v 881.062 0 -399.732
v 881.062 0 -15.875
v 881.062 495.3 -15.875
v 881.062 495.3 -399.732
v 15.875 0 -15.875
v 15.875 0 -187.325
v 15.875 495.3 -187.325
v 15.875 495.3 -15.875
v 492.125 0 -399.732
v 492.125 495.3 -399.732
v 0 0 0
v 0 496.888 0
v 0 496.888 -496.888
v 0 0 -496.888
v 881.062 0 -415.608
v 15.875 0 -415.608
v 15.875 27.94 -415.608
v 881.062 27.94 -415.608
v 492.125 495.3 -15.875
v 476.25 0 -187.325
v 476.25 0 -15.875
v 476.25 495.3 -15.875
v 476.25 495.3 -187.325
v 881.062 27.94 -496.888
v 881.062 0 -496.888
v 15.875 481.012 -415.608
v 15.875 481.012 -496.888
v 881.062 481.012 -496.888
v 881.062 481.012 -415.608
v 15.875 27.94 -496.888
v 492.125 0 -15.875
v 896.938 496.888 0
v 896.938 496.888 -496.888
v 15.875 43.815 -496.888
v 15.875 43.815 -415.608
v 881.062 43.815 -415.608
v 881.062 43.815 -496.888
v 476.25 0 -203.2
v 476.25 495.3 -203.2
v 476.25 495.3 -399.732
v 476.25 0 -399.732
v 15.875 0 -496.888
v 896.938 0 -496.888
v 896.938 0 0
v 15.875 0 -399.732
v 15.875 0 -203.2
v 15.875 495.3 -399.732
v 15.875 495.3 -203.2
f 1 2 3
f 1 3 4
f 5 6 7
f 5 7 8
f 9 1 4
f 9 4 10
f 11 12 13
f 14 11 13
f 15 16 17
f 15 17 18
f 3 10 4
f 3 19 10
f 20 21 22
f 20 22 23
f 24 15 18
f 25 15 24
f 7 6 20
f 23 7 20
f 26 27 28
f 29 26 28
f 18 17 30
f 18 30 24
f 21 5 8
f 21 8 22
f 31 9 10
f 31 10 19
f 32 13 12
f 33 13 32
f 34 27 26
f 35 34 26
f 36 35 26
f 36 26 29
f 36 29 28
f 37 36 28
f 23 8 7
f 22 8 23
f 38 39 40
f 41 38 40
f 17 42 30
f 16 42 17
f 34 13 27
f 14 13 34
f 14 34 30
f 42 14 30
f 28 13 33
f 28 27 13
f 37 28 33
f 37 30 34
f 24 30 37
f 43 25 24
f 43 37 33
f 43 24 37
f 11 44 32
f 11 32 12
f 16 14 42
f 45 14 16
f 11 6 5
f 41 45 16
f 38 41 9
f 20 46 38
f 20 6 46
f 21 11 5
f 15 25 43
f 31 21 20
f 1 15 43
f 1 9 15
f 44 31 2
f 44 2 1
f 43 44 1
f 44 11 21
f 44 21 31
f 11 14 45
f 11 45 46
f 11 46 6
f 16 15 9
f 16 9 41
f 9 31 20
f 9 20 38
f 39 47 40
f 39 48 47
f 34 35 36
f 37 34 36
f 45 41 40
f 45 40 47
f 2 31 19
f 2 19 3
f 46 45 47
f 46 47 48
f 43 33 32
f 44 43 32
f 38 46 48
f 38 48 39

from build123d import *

# Parameters (mm, degrees)
F0_W      = 460.375
F0_H      = 15.875
F1_DEPTH  = 496.8875
F2_START  = -27.94
F0_W_2    = 865.1875
F0_H_2    = 81.28
F2_DEPTH  = 15.875
F3_START  = 437.1975
F2_FACE_W = 865.1875
F2_FACE_H = 81.28
F3_DEPTH  = 15.875
F4_START  = -495.3
F0_H_3    = 196.5325
F0_W_3    = 388.9375
F0_H_4    = 383.8575
F0_H_5    = 171.45
F4_DEPTH  = 1.5875


with BuildPart() as f1:
    # F0 (on Front) → F1 (new body)
    with BuildSketch(Plane.XZ):
        Polygon((881.0625, 0), (15.875, 0), (15.875, -15.875), (476.25, -15.875), (492.125, -15.875), (881.0625, -15.875), align=None)
        Polygon((896.9375, 0), (881.0625, 0), (881.0625, -15.875), (881.0625, -399.7325), (881.0625, -415.6075), (881.0625, -496.8875), (896.9375, -496.8875), align=None)
        Polygon((15.875, 0), (0, 0), (0, -496.8875), (15.875, -496.8875), (15.875, -415.6075), (15.875, -399.7325), (15.875, -203.2), (15.875, -187.325), (15.875, -15.875), align=None)
        with Locations((246.0625, -195.2625)):
            Rectangle(F0_W, F0_H)
        Polygon((492.125, -15.875), (476.25, -15.875), (476.25, -187.325), (476.25, -203.2), (476.25, -399.7325), (492.125, -399.7325), align=None)
        Polygon((15.875, -399.7325), (15.875, -415.6075), (881.0625, -415.6075), (881.0625, -399.7325), (492.125, -399.7325), (476.25, -399.7325), align=None)
    extrude(amount=-F1_DEPTH)

    # F0 (on Front) → F2 (join)
    with BuildSketch(Plane.XZ.offset(F2_START)):
        with Locations((448.46875, -456.2475)):
            Rectangle(F0_W_2, F0_H_2)
    extrude(amount=-F2_DEPTH)

    # F2_face (on face) → F3 (join)
    with BuildSketch(Plane(origin=(448.46875, 43.815, -456.2475), x_dir=(1, 0, 0), z_dir=(0, 1, 0)).offset(F3_START)):
        Rectangle(F2_FACE_W, F2_FACE_H)
    extrude(amount=F3_DEPTH)

    # F0 (on Front) → F4 (join)
    with BuildSketch(Plane.XZ.offset(F4_START)):
        with Locations((448.46875, -456.2475)):
            Rectangle(F0_W_2, F0_H_2)
        Polygon((15.875, -399.7325), (15.875, -415.6075), (881.0625, -415.6075), (881.0625, -399.7325), (492.125, -399.7325), (476.25, -399.7325), align=None)
        with Locations((246.0625, -301.46625)):
            Rectangle(F0_W, F0_H_3)
        with Locations((686.59375, -207.80375)):
            Rectangle(F0_W_3, F0_H_4)
        with Locations((246.0625, -195.2625)):
            Rectangle(F0_W, F0_H)
        Polygon((492.125, -15.875), (476.25, -15.875), (476.25, -187.325), (476.25, -203.2), (476.25, -399.7325), (492.125, -399.7325), align=None)
        with Locations((246.0625, -101.6)):
            Rectangle(F0_W, F0_H_5)
        Polygon((881.0625, 0), (15.875, 0), (15.875, -15.875), (476.25, -15.875), (492.125, -15.875), (881.0625, -15.875), align=None)
        Polygon((896.9375, 0), (881.0625, 0), (881.0625, -15.875), (881.0625, -399.7325), (881.0625, -415.6075), (881.0625, -496.8875), (896.9375, -496.8875), align=None)
        Polygon((15.875, 0), (0, 0), (0, -496.8875), (15.875, -496.8875), (15.875, -415.6075), (15.875, -399.7325), (15.875, -203.2), (15.875, -187.325), (15.875, -15.875), align=None)
    extrude(amount=-F4_DEPTH)


solid = f1.part
